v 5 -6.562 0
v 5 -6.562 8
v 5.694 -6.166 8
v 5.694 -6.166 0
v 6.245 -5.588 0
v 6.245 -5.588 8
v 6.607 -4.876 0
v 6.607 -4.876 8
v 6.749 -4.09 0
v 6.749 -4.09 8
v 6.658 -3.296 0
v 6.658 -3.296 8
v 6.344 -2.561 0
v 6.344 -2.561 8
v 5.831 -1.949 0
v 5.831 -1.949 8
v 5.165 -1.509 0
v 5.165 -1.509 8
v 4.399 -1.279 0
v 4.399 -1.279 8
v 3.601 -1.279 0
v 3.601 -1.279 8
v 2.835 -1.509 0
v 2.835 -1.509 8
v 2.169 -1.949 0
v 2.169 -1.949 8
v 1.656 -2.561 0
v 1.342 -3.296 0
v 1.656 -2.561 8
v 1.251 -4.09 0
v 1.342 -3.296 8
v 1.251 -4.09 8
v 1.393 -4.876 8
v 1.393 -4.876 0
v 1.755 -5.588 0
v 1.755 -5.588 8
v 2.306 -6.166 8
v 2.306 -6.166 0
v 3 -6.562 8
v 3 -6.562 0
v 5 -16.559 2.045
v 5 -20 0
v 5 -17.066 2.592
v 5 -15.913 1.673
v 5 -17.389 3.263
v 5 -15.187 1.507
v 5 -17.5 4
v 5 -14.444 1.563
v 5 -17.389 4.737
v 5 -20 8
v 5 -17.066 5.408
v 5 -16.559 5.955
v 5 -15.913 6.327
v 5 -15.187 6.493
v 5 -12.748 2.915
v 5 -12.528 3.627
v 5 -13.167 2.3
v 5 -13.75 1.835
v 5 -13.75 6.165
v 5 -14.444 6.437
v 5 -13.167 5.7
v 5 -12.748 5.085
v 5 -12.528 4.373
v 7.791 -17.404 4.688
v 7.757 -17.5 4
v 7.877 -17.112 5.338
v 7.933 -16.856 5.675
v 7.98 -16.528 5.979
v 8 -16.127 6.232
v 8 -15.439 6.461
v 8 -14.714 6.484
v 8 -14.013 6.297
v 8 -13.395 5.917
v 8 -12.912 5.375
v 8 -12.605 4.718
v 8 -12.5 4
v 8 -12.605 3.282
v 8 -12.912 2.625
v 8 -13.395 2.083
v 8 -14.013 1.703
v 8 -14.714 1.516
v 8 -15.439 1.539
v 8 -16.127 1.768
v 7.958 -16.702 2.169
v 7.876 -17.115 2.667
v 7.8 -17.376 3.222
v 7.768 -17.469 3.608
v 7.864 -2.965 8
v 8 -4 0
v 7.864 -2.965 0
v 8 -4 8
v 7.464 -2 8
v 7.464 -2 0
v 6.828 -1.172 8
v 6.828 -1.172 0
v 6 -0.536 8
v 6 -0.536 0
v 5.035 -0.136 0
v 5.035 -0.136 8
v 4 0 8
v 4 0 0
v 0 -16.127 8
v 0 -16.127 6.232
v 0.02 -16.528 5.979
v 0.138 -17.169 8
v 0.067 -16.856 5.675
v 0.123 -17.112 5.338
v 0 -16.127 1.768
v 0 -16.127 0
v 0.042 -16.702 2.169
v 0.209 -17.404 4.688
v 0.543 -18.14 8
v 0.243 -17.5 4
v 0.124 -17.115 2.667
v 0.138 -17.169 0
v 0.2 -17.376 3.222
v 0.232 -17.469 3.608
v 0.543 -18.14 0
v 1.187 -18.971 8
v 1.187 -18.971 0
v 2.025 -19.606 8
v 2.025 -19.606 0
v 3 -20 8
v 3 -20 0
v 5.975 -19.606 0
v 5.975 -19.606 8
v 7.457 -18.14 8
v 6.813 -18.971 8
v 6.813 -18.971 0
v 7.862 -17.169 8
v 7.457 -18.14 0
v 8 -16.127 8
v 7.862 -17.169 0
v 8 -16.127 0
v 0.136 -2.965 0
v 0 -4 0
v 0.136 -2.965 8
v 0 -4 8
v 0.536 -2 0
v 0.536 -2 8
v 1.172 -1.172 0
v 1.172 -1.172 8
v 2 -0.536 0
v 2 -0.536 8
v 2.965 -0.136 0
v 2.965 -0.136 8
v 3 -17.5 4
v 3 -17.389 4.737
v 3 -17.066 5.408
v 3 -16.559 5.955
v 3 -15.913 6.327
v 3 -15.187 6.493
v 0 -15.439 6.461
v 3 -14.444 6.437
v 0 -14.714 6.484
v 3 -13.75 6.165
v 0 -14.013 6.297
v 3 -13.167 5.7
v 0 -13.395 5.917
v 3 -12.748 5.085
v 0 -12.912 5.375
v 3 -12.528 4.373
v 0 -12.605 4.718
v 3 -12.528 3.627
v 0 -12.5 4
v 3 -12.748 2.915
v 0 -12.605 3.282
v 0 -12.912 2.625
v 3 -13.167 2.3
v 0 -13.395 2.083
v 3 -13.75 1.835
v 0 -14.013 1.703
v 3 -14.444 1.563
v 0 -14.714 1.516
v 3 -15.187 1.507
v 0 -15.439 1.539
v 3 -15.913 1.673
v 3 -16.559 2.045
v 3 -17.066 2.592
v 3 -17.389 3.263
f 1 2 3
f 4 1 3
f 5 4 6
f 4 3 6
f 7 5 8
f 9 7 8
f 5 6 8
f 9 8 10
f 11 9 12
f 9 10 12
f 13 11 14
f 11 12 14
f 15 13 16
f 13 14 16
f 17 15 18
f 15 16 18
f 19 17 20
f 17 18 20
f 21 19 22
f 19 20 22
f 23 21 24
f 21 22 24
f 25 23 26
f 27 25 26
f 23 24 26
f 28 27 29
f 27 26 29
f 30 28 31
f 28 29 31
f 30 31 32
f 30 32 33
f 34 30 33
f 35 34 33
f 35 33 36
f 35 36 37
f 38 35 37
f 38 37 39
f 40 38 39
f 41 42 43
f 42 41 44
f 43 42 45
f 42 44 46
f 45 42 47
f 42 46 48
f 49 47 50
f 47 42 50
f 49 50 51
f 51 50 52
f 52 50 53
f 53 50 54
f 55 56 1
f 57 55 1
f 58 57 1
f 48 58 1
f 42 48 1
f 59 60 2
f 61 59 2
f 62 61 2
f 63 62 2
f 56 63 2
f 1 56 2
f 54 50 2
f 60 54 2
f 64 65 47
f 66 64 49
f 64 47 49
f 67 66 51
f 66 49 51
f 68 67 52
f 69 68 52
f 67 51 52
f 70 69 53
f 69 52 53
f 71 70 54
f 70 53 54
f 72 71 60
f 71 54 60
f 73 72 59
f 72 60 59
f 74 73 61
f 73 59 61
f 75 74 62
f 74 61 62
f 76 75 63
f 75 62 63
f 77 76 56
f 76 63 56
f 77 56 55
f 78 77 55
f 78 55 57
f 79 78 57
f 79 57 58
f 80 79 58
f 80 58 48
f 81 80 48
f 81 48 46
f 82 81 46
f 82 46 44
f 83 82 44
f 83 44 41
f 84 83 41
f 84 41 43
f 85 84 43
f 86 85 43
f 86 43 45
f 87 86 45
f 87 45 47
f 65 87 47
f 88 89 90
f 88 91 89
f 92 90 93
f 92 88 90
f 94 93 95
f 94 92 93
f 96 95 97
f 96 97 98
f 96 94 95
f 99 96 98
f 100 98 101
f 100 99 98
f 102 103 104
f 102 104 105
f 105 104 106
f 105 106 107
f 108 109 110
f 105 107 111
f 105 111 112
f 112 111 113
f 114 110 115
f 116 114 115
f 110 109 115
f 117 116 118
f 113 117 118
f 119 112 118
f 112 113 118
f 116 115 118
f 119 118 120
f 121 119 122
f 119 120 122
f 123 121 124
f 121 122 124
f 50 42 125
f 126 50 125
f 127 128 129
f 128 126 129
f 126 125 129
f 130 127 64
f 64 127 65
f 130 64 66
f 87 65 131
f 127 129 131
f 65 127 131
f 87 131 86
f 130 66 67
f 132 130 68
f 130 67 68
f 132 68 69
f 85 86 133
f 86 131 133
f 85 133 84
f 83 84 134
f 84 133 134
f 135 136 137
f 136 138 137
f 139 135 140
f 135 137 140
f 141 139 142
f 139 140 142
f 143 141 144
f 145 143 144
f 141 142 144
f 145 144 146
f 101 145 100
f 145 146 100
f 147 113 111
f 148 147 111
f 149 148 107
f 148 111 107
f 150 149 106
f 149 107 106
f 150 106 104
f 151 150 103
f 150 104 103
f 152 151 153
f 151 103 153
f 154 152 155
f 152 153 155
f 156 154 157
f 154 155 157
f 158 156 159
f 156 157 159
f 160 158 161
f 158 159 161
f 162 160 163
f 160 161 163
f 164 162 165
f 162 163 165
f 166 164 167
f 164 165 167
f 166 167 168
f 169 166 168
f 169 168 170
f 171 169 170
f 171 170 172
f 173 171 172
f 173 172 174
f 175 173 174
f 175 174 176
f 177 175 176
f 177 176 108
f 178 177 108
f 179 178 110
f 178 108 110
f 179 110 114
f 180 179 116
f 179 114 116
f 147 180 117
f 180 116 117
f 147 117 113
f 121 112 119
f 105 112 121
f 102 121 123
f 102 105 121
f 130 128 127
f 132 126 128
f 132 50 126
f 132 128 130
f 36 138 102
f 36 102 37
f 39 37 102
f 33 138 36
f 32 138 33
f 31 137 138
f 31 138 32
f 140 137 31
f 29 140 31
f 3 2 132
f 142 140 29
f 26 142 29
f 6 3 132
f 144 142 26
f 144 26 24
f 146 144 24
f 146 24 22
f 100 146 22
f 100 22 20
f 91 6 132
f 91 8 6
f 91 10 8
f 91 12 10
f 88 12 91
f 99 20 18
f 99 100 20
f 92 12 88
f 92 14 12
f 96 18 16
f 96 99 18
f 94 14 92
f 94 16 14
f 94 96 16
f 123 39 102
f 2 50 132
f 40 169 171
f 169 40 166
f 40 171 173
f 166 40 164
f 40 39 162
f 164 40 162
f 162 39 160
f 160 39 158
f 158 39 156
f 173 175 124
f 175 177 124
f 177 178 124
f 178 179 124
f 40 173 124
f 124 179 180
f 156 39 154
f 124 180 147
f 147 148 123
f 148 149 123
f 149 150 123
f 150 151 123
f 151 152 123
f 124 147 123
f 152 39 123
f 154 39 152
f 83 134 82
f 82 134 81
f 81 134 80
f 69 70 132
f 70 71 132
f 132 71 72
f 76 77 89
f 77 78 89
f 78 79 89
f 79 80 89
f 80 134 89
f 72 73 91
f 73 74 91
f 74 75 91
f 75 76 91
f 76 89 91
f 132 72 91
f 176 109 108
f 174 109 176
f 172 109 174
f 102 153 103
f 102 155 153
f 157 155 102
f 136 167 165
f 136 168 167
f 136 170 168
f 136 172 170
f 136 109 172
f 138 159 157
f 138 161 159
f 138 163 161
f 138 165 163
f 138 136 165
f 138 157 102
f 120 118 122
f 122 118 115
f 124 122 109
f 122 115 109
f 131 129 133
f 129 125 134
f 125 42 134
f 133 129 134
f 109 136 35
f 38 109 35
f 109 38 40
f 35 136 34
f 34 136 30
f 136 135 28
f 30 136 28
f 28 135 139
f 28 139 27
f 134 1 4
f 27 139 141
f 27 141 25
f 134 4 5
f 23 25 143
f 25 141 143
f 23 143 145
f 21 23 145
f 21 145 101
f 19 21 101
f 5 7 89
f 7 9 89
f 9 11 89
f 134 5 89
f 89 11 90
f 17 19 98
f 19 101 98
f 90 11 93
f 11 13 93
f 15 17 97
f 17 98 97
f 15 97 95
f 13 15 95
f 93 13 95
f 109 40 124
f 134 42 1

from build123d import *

# Parameters (mm, degrees)
F0_W        = 8
F0_H        = 8
F1_DEPTH    = 20
F2_R        = 3.99999
F4_DEPTH    = 25
F6_T1_DEPTH = 27.364916731
F5_R        = 2.5
F7_DEPTH    = 25


# Not quite as in the source:
# - a fillet or chamfer that OpenCascade refuses, or shapes differently, is made with other operations: its cross-section is extruded or revolved along the edge and cut away or added
# - a fillet or chamfer is up to 0.001 mm smaller than in the source, because OpenCascade refuses the exact size


with BuildPart() as f1:
    # F0 (on Front) → F1 (new body)
    with BuildSketch(Plane.XZ):
        with Locations((4, 4)):
            Rectangle(F0_W, F0_H)
    extrude(amount=F1_DEPTH)

    # F2 (radius 4 in the source; OpenCascade refuses exactly that, so slightly less here)
    f2_edges = [f1.edges().sort_by_distance(p)[0] for p in [
        (8, 0, 4),
        (0, 0, 4),
    ]]
    fillet(f2_edges, radius=F2_R)

    # F3 (on face) → F4 (cut)
    with BuildSketch(Plane.XY.offset(8)):
        with BuildLine():
            Line((5, -20), (5, -6.5617376915))
            ThreePointArc((5, -6.5617376915), (4, -1.25), (3, -6.5617376915))
            Line((3, -6.5617376915), (3, -20))
            Line((3, -20), (4, -20))
            Line((4, -20), (5, -20))
        make_face()
    extrude(amount=-F4_DEPTH, mode=Mode.SUBTRACT)

    # F6: fillet of radius 4 on 2 edges, made by hand

    # F6_s2 → F6_t1 (cut)
    with BuildSketch(Plane.XY.offset(-9.6824583655)):
        with BuildLine():
            ThreePointArc((0, -16.1270166538), (0.8377223398, -18.5765063966), (3, -20))
            Line((3, -20), (0, -20))
            Line((0, -20), (0, -16.1270166538))
        make_face()
        with BuildLine():
            ThreePointArc((5, -20), (7.1622776602, -18.5765063966), (8, -16.1270166538))
            Line((8, -16.1270166538), (8, -20))
            Line((8, -20), (5, -20))
        make_face()
    extrude(amount=F6_T1_DEPTH, mode=Mode.SUBTRACT)

    # F5 (on face) → F7 (cut)
    with BuildSketch(Plane(origin=(0, 0, 0), x_dir=(0, -1, 0), z_dir=(-1, 0, 0))):
        with Locations((15, 4)):
            Circle(F5_R)
    extrude(amount=-F7_DEPTH, mode=Mode.SUBTRACT)


solid = f1.part
